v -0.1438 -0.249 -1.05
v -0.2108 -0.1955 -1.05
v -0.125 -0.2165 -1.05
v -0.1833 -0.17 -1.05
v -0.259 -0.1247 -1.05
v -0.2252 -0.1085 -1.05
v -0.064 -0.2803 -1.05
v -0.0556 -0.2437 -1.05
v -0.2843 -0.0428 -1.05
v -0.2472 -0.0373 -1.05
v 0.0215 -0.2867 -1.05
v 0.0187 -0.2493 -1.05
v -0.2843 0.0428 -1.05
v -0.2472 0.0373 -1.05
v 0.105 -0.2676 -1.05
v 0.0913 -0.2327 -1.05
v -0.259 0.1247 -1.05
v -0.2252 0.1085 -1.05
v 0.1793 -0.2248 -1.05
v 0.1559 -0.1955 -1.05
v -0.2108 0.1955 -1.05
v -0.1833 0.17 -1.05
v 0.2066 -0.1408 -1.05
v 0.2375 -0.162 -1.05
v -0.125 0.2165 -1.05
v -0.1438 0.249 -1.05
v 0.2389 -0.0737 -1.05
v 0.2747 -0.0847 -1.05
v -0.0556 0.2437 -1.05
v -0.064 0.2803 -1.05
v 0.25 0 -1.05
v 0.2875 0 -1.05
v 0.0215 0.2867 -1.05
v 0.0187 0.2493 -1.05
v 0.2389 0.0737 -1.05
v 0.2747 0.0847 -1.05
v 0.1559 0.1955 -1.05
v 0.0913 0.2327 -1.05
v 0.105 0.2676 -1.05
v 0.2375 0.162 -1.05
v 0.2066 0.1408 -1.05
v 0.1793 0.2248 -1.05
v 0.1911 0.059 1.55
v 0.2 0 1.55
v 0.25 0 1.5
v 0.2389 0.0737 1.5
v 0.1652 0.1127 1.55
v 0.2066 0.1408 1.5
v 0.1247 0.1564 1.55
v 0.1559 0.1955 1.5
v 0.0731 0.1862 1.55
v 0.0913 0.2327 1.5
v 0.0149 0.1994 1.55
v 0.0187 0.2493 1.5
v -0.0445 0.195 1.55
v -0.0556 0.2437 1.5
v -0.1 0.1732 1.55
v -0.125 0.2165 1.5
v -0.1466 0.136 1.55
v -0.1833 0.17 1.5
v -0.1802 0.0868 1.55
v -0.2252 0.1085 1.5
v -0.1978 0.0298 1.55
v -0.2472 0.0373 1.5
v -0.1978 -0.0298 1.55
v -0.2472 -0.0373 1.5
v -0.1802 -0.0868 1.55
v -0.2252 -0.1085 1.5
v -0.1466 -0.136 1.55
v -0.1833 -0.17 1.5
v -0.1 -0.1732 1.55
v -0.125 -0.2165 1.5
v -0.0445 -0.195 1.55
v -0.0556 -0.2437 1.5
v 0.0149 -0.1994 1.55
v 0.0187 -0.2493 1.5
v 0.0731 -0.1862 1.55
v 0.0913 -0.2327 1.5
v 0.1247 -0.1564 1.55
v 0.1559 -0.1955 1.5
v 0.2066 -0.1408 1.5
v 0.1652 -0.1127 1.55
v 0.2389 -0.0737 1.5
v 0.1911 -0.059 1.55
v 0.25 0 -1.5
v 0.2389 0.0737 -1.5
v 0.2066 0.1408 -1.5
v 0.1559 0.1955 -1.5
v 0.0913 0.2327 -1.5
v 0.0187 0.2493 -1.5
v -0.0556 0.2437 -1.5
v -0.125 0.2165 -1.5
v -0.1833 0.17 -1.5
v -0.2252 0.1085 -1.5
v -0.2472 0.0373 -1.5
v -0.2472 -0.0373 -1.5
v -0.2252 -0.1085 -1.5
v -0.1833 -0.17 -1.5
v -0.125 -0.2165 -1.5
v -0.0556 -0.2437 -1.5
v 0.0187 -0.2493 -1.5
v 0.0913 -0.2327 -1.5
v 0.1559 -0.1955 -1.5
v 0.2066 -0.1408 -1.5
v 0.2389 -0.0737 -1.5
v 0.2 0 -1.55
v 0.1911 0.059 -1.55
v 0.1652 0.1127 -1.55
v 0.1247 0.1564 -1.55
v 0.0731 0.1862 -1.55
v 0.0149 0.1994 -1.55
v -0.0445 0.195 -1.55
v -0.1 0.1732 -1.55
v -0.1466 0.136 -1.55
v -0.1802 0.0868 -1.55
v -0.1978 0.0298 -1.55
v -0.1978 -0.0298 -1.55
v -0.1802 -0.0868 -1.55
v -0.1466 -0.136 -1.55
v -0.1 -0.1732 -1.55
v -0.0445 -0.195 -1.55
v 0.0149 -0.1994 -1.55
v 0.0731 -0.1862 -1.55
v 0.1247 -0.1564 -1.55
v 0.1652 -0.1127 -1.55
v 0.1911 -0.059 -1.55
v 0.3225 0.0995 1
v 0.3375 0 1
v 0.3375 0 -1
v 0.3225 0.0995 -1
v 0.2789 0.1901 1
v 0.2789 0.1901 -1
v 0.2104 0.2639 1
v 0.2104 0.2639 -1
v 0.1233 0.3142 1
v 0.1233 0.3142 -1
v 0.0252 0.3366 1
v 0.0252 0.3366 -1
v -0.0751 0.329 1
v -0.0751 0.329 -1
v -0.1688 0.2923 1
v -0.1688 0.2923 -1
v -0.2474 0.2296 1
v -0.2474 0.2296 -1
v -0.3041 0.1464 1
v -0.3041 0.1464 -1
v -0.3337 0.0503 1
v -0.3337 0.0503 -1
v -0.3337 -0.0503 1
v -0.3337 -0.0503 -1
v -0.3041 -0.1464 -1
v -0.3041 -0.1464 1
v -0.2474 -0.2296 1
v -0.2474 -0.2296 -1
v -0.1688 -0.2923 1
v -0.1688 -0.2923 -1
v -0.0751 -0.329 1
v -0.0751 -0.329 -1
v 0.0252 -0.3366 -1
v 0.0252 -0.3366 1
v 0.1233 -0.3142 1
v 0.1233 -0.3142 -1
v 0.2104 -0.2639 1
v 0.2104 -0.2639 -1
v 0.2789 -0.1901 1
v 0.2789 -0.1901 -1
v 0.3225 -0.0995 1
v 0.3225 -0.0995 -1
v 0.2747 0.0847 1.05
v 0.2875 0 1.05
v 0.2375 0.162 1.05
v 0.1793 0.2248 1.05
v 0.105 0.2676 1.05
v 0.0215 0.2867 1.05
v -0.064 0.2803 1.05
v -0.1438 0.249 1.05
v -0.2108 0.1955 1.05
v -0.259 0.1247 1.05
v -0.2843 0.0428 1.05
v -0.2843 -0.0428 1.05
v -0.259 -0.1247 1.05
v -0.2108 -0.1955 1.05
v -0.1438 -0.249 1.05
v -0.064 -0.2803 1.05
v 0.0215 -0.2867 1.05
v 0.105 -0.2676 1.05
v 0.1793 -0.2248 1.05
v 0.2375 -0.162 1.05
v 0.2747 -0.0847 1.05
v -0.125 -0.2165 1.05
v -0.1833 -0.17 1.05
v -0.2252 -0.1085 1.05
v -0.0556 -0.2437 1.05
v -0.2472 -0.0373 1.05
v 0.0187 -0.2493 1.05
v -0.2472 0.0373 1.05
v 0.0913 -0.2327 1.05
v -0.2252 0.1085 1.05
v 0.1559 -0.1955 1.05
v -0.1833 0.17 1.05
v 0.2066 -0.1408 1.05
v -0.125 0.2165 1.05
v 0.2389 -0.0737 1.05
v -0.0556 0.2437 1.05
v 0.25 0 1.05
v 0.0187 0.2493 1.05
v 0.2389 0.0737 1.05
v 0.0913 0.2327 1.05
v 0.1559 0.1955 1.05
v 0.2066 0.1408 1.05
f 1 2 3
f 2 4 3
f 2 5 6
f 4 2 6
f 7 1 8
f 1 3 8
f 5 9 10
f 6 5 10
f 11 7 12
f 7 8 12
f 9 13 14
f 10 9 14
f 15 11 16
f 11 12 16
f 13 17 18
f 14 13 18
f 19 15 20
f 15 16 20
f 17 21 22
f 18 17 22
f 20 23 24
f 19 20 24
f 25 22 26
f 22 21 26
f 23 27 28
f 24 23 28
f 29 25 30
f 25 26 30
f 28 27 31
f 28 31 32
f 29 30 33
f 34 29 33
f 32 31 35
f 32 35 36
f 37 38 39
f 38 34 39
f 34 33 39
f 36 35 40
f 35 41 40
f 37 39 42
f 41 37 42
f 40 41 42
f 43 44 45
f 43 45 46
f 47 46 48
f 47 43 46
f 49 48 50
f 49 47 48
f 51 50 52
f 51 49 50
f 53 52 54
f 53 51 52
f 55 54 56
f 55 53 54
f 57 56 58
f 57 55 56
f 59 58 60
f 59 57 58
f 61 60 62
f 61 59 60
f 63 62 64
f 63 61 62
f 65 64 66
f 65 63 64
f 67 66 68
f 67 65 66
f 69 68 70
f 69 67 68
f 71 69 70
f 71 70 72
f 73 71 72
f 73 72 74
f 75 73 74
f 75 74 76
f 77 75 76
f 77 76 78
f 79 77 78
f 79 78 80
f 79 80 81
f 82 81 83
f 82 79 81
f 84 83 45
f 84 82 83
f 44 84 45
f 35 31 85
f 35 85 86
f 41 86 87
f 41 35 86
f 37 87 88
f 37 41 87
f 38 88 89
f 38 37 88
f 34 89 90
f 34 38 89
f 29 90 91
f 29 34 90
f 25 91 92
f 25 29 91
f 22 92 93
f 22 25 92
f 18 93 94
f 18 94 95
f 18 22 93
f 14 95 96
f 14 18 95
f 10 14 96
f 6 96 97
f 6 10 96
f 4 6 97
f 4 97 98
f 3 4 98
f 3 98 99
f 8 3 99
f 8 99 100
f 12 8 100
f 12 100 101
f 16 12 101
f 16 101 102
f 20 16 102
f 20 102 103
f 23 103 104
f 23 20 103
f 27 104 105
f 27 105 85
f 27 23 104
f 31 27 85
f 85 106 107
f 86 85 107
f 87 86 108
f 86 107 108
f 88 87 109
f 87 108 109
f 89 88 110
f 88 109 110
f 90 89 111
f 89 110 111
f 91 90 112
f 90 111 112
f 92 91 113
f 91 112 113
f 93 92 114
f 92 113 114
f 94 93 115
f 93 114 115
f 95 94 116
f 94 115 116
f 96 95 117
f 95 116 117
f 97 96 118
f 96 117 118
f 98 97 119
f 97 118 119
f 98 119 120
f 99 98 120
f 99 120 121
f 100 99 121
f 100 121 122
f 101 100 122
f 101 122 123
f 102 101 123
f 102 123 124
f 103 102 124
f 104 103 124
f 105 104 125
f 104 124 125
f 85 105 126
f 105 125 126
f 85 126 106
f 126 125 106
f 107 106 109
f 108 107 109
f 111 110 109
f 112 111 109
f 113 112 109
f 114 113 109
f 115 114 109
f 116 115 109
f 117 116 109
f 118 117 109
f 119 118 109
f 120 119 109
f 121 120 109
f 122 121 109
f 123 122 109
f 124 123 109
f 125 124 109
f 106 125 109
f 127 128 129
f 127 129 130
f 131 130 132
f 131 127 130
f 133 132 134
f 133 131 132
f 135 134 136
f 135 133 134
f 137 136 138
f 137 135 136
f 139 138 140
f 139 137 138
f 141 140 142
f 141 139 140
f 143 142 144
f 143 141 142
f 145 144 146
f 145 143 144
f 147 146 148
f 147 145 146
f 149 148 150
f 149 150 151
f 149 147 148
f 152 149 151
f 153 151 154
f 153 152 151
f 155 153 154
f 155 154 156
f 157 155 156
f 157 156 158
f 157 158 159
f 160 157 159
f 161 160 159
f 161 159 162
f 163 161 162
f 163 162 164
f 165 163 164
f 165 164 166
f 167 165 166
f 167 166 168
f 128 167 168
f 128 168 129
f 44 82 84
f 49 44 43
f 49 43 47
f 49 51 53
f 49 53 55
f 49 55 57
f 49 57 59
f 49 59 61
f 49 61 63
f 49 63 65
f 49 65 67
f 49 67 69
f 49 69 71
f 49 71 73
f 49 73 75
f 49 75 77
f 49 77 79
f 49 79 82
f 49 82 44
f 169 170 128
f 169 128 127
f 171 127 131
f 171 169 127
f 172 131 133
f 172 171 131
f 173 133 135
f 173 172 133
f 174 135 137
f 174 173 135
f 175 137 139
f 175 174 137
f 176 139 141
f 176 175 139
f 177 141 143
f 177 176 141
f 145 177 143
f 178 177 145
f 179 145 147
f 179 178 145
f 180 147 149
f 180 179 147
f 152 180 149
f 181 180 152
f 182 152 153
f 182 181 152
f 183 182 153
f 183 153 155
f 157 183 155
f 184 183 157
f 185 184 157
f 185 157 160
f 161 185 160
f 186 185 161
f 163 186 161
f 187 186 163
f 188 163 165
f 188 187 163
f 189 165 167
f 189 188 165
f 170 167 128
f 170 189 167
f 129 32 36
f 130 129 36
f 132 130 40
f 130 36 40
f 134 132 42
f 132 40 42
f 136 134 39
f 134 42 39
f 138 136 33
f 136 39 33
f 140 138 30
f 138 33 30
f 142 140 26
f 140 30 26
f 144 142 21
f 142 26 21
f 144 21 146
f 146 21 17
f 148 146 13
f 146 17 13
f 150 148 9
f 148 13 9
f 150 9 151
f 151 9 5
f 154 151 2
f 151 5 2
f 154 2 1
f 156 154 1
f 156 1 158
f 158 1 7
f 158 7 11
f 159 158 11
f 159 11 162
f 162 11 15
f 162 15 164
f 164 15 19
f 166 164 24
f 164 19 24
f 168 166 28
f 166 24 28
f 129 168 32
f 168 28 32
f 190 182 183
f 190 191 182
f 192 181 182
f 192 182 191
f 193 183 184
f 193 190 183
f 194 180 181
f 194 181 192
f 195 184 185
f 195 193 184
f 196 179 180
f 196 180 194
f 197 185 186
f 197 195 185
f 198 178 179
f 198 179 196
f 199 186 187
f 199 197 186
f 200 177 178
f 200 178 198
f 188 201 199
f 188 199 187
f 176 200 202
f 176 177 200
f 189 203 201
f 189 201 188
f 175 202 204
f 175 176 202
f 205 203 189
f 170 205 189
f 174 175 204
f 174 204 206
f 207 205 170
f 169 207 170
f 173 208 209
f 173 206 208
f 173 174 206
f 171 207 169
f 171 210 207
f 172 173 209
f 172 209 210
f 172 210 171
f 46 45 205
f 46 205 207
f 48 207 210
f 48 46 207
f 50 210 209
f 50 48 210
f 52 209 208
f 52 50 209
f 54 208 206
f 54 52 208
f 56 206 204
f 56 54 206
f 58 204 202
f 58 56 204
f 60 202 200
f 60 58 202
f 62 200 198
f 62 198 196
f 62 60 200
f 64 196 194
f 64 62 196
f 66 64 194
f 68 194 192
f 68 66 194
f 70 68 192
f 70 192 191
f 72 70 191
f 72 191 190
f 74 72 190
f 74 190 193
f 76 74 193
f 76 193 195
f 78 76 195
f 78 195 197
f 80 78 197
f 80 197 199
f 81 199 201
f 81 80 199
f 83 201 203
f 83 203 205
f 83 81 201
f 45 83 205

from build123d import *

# Parameters (mm, degrees)
SKETCH1_R           = 0.25
BOSS_EXTRUDE1_DEPTH = 1.55
SKETCH3_R           = 0.3375
BOSS_EXTRUDE2_DEPTH = 1.05
CHAMFER1_SIZE       = 0.05


with BuildPart() as part:
    # Sketch1 → Boss-Extrude1 (new body, symmetric)
    with BuildSketch(Plane.XY):
        Circle(SKETCH1_R)
    extrude(amount=BOSS_EXTRUDE1_DEPTH, both=True)

    # Sketch3 → Boss-Extrude2 (add, symmetric)
    with BuildSketch(Plane.XY):
        Circle(SKETCH3_R)
    extrude(amount=BOSS_EXTRUDE2_DEPTH, both=True)

    # Chamfer1
    chamfer1_edges = [part.edges().sort_by_distance(p)[0] for p in [
        (-0.25, 0, 1.55),
        (-0.25, 0, -1.55),
        (-0.3375, 0, -1.05),
        (-0.3375, 0, 1.05),
    ]]
    chamfer(chamfer1_edges, length=CHAMFER1_SIZE)


solid = part.part
